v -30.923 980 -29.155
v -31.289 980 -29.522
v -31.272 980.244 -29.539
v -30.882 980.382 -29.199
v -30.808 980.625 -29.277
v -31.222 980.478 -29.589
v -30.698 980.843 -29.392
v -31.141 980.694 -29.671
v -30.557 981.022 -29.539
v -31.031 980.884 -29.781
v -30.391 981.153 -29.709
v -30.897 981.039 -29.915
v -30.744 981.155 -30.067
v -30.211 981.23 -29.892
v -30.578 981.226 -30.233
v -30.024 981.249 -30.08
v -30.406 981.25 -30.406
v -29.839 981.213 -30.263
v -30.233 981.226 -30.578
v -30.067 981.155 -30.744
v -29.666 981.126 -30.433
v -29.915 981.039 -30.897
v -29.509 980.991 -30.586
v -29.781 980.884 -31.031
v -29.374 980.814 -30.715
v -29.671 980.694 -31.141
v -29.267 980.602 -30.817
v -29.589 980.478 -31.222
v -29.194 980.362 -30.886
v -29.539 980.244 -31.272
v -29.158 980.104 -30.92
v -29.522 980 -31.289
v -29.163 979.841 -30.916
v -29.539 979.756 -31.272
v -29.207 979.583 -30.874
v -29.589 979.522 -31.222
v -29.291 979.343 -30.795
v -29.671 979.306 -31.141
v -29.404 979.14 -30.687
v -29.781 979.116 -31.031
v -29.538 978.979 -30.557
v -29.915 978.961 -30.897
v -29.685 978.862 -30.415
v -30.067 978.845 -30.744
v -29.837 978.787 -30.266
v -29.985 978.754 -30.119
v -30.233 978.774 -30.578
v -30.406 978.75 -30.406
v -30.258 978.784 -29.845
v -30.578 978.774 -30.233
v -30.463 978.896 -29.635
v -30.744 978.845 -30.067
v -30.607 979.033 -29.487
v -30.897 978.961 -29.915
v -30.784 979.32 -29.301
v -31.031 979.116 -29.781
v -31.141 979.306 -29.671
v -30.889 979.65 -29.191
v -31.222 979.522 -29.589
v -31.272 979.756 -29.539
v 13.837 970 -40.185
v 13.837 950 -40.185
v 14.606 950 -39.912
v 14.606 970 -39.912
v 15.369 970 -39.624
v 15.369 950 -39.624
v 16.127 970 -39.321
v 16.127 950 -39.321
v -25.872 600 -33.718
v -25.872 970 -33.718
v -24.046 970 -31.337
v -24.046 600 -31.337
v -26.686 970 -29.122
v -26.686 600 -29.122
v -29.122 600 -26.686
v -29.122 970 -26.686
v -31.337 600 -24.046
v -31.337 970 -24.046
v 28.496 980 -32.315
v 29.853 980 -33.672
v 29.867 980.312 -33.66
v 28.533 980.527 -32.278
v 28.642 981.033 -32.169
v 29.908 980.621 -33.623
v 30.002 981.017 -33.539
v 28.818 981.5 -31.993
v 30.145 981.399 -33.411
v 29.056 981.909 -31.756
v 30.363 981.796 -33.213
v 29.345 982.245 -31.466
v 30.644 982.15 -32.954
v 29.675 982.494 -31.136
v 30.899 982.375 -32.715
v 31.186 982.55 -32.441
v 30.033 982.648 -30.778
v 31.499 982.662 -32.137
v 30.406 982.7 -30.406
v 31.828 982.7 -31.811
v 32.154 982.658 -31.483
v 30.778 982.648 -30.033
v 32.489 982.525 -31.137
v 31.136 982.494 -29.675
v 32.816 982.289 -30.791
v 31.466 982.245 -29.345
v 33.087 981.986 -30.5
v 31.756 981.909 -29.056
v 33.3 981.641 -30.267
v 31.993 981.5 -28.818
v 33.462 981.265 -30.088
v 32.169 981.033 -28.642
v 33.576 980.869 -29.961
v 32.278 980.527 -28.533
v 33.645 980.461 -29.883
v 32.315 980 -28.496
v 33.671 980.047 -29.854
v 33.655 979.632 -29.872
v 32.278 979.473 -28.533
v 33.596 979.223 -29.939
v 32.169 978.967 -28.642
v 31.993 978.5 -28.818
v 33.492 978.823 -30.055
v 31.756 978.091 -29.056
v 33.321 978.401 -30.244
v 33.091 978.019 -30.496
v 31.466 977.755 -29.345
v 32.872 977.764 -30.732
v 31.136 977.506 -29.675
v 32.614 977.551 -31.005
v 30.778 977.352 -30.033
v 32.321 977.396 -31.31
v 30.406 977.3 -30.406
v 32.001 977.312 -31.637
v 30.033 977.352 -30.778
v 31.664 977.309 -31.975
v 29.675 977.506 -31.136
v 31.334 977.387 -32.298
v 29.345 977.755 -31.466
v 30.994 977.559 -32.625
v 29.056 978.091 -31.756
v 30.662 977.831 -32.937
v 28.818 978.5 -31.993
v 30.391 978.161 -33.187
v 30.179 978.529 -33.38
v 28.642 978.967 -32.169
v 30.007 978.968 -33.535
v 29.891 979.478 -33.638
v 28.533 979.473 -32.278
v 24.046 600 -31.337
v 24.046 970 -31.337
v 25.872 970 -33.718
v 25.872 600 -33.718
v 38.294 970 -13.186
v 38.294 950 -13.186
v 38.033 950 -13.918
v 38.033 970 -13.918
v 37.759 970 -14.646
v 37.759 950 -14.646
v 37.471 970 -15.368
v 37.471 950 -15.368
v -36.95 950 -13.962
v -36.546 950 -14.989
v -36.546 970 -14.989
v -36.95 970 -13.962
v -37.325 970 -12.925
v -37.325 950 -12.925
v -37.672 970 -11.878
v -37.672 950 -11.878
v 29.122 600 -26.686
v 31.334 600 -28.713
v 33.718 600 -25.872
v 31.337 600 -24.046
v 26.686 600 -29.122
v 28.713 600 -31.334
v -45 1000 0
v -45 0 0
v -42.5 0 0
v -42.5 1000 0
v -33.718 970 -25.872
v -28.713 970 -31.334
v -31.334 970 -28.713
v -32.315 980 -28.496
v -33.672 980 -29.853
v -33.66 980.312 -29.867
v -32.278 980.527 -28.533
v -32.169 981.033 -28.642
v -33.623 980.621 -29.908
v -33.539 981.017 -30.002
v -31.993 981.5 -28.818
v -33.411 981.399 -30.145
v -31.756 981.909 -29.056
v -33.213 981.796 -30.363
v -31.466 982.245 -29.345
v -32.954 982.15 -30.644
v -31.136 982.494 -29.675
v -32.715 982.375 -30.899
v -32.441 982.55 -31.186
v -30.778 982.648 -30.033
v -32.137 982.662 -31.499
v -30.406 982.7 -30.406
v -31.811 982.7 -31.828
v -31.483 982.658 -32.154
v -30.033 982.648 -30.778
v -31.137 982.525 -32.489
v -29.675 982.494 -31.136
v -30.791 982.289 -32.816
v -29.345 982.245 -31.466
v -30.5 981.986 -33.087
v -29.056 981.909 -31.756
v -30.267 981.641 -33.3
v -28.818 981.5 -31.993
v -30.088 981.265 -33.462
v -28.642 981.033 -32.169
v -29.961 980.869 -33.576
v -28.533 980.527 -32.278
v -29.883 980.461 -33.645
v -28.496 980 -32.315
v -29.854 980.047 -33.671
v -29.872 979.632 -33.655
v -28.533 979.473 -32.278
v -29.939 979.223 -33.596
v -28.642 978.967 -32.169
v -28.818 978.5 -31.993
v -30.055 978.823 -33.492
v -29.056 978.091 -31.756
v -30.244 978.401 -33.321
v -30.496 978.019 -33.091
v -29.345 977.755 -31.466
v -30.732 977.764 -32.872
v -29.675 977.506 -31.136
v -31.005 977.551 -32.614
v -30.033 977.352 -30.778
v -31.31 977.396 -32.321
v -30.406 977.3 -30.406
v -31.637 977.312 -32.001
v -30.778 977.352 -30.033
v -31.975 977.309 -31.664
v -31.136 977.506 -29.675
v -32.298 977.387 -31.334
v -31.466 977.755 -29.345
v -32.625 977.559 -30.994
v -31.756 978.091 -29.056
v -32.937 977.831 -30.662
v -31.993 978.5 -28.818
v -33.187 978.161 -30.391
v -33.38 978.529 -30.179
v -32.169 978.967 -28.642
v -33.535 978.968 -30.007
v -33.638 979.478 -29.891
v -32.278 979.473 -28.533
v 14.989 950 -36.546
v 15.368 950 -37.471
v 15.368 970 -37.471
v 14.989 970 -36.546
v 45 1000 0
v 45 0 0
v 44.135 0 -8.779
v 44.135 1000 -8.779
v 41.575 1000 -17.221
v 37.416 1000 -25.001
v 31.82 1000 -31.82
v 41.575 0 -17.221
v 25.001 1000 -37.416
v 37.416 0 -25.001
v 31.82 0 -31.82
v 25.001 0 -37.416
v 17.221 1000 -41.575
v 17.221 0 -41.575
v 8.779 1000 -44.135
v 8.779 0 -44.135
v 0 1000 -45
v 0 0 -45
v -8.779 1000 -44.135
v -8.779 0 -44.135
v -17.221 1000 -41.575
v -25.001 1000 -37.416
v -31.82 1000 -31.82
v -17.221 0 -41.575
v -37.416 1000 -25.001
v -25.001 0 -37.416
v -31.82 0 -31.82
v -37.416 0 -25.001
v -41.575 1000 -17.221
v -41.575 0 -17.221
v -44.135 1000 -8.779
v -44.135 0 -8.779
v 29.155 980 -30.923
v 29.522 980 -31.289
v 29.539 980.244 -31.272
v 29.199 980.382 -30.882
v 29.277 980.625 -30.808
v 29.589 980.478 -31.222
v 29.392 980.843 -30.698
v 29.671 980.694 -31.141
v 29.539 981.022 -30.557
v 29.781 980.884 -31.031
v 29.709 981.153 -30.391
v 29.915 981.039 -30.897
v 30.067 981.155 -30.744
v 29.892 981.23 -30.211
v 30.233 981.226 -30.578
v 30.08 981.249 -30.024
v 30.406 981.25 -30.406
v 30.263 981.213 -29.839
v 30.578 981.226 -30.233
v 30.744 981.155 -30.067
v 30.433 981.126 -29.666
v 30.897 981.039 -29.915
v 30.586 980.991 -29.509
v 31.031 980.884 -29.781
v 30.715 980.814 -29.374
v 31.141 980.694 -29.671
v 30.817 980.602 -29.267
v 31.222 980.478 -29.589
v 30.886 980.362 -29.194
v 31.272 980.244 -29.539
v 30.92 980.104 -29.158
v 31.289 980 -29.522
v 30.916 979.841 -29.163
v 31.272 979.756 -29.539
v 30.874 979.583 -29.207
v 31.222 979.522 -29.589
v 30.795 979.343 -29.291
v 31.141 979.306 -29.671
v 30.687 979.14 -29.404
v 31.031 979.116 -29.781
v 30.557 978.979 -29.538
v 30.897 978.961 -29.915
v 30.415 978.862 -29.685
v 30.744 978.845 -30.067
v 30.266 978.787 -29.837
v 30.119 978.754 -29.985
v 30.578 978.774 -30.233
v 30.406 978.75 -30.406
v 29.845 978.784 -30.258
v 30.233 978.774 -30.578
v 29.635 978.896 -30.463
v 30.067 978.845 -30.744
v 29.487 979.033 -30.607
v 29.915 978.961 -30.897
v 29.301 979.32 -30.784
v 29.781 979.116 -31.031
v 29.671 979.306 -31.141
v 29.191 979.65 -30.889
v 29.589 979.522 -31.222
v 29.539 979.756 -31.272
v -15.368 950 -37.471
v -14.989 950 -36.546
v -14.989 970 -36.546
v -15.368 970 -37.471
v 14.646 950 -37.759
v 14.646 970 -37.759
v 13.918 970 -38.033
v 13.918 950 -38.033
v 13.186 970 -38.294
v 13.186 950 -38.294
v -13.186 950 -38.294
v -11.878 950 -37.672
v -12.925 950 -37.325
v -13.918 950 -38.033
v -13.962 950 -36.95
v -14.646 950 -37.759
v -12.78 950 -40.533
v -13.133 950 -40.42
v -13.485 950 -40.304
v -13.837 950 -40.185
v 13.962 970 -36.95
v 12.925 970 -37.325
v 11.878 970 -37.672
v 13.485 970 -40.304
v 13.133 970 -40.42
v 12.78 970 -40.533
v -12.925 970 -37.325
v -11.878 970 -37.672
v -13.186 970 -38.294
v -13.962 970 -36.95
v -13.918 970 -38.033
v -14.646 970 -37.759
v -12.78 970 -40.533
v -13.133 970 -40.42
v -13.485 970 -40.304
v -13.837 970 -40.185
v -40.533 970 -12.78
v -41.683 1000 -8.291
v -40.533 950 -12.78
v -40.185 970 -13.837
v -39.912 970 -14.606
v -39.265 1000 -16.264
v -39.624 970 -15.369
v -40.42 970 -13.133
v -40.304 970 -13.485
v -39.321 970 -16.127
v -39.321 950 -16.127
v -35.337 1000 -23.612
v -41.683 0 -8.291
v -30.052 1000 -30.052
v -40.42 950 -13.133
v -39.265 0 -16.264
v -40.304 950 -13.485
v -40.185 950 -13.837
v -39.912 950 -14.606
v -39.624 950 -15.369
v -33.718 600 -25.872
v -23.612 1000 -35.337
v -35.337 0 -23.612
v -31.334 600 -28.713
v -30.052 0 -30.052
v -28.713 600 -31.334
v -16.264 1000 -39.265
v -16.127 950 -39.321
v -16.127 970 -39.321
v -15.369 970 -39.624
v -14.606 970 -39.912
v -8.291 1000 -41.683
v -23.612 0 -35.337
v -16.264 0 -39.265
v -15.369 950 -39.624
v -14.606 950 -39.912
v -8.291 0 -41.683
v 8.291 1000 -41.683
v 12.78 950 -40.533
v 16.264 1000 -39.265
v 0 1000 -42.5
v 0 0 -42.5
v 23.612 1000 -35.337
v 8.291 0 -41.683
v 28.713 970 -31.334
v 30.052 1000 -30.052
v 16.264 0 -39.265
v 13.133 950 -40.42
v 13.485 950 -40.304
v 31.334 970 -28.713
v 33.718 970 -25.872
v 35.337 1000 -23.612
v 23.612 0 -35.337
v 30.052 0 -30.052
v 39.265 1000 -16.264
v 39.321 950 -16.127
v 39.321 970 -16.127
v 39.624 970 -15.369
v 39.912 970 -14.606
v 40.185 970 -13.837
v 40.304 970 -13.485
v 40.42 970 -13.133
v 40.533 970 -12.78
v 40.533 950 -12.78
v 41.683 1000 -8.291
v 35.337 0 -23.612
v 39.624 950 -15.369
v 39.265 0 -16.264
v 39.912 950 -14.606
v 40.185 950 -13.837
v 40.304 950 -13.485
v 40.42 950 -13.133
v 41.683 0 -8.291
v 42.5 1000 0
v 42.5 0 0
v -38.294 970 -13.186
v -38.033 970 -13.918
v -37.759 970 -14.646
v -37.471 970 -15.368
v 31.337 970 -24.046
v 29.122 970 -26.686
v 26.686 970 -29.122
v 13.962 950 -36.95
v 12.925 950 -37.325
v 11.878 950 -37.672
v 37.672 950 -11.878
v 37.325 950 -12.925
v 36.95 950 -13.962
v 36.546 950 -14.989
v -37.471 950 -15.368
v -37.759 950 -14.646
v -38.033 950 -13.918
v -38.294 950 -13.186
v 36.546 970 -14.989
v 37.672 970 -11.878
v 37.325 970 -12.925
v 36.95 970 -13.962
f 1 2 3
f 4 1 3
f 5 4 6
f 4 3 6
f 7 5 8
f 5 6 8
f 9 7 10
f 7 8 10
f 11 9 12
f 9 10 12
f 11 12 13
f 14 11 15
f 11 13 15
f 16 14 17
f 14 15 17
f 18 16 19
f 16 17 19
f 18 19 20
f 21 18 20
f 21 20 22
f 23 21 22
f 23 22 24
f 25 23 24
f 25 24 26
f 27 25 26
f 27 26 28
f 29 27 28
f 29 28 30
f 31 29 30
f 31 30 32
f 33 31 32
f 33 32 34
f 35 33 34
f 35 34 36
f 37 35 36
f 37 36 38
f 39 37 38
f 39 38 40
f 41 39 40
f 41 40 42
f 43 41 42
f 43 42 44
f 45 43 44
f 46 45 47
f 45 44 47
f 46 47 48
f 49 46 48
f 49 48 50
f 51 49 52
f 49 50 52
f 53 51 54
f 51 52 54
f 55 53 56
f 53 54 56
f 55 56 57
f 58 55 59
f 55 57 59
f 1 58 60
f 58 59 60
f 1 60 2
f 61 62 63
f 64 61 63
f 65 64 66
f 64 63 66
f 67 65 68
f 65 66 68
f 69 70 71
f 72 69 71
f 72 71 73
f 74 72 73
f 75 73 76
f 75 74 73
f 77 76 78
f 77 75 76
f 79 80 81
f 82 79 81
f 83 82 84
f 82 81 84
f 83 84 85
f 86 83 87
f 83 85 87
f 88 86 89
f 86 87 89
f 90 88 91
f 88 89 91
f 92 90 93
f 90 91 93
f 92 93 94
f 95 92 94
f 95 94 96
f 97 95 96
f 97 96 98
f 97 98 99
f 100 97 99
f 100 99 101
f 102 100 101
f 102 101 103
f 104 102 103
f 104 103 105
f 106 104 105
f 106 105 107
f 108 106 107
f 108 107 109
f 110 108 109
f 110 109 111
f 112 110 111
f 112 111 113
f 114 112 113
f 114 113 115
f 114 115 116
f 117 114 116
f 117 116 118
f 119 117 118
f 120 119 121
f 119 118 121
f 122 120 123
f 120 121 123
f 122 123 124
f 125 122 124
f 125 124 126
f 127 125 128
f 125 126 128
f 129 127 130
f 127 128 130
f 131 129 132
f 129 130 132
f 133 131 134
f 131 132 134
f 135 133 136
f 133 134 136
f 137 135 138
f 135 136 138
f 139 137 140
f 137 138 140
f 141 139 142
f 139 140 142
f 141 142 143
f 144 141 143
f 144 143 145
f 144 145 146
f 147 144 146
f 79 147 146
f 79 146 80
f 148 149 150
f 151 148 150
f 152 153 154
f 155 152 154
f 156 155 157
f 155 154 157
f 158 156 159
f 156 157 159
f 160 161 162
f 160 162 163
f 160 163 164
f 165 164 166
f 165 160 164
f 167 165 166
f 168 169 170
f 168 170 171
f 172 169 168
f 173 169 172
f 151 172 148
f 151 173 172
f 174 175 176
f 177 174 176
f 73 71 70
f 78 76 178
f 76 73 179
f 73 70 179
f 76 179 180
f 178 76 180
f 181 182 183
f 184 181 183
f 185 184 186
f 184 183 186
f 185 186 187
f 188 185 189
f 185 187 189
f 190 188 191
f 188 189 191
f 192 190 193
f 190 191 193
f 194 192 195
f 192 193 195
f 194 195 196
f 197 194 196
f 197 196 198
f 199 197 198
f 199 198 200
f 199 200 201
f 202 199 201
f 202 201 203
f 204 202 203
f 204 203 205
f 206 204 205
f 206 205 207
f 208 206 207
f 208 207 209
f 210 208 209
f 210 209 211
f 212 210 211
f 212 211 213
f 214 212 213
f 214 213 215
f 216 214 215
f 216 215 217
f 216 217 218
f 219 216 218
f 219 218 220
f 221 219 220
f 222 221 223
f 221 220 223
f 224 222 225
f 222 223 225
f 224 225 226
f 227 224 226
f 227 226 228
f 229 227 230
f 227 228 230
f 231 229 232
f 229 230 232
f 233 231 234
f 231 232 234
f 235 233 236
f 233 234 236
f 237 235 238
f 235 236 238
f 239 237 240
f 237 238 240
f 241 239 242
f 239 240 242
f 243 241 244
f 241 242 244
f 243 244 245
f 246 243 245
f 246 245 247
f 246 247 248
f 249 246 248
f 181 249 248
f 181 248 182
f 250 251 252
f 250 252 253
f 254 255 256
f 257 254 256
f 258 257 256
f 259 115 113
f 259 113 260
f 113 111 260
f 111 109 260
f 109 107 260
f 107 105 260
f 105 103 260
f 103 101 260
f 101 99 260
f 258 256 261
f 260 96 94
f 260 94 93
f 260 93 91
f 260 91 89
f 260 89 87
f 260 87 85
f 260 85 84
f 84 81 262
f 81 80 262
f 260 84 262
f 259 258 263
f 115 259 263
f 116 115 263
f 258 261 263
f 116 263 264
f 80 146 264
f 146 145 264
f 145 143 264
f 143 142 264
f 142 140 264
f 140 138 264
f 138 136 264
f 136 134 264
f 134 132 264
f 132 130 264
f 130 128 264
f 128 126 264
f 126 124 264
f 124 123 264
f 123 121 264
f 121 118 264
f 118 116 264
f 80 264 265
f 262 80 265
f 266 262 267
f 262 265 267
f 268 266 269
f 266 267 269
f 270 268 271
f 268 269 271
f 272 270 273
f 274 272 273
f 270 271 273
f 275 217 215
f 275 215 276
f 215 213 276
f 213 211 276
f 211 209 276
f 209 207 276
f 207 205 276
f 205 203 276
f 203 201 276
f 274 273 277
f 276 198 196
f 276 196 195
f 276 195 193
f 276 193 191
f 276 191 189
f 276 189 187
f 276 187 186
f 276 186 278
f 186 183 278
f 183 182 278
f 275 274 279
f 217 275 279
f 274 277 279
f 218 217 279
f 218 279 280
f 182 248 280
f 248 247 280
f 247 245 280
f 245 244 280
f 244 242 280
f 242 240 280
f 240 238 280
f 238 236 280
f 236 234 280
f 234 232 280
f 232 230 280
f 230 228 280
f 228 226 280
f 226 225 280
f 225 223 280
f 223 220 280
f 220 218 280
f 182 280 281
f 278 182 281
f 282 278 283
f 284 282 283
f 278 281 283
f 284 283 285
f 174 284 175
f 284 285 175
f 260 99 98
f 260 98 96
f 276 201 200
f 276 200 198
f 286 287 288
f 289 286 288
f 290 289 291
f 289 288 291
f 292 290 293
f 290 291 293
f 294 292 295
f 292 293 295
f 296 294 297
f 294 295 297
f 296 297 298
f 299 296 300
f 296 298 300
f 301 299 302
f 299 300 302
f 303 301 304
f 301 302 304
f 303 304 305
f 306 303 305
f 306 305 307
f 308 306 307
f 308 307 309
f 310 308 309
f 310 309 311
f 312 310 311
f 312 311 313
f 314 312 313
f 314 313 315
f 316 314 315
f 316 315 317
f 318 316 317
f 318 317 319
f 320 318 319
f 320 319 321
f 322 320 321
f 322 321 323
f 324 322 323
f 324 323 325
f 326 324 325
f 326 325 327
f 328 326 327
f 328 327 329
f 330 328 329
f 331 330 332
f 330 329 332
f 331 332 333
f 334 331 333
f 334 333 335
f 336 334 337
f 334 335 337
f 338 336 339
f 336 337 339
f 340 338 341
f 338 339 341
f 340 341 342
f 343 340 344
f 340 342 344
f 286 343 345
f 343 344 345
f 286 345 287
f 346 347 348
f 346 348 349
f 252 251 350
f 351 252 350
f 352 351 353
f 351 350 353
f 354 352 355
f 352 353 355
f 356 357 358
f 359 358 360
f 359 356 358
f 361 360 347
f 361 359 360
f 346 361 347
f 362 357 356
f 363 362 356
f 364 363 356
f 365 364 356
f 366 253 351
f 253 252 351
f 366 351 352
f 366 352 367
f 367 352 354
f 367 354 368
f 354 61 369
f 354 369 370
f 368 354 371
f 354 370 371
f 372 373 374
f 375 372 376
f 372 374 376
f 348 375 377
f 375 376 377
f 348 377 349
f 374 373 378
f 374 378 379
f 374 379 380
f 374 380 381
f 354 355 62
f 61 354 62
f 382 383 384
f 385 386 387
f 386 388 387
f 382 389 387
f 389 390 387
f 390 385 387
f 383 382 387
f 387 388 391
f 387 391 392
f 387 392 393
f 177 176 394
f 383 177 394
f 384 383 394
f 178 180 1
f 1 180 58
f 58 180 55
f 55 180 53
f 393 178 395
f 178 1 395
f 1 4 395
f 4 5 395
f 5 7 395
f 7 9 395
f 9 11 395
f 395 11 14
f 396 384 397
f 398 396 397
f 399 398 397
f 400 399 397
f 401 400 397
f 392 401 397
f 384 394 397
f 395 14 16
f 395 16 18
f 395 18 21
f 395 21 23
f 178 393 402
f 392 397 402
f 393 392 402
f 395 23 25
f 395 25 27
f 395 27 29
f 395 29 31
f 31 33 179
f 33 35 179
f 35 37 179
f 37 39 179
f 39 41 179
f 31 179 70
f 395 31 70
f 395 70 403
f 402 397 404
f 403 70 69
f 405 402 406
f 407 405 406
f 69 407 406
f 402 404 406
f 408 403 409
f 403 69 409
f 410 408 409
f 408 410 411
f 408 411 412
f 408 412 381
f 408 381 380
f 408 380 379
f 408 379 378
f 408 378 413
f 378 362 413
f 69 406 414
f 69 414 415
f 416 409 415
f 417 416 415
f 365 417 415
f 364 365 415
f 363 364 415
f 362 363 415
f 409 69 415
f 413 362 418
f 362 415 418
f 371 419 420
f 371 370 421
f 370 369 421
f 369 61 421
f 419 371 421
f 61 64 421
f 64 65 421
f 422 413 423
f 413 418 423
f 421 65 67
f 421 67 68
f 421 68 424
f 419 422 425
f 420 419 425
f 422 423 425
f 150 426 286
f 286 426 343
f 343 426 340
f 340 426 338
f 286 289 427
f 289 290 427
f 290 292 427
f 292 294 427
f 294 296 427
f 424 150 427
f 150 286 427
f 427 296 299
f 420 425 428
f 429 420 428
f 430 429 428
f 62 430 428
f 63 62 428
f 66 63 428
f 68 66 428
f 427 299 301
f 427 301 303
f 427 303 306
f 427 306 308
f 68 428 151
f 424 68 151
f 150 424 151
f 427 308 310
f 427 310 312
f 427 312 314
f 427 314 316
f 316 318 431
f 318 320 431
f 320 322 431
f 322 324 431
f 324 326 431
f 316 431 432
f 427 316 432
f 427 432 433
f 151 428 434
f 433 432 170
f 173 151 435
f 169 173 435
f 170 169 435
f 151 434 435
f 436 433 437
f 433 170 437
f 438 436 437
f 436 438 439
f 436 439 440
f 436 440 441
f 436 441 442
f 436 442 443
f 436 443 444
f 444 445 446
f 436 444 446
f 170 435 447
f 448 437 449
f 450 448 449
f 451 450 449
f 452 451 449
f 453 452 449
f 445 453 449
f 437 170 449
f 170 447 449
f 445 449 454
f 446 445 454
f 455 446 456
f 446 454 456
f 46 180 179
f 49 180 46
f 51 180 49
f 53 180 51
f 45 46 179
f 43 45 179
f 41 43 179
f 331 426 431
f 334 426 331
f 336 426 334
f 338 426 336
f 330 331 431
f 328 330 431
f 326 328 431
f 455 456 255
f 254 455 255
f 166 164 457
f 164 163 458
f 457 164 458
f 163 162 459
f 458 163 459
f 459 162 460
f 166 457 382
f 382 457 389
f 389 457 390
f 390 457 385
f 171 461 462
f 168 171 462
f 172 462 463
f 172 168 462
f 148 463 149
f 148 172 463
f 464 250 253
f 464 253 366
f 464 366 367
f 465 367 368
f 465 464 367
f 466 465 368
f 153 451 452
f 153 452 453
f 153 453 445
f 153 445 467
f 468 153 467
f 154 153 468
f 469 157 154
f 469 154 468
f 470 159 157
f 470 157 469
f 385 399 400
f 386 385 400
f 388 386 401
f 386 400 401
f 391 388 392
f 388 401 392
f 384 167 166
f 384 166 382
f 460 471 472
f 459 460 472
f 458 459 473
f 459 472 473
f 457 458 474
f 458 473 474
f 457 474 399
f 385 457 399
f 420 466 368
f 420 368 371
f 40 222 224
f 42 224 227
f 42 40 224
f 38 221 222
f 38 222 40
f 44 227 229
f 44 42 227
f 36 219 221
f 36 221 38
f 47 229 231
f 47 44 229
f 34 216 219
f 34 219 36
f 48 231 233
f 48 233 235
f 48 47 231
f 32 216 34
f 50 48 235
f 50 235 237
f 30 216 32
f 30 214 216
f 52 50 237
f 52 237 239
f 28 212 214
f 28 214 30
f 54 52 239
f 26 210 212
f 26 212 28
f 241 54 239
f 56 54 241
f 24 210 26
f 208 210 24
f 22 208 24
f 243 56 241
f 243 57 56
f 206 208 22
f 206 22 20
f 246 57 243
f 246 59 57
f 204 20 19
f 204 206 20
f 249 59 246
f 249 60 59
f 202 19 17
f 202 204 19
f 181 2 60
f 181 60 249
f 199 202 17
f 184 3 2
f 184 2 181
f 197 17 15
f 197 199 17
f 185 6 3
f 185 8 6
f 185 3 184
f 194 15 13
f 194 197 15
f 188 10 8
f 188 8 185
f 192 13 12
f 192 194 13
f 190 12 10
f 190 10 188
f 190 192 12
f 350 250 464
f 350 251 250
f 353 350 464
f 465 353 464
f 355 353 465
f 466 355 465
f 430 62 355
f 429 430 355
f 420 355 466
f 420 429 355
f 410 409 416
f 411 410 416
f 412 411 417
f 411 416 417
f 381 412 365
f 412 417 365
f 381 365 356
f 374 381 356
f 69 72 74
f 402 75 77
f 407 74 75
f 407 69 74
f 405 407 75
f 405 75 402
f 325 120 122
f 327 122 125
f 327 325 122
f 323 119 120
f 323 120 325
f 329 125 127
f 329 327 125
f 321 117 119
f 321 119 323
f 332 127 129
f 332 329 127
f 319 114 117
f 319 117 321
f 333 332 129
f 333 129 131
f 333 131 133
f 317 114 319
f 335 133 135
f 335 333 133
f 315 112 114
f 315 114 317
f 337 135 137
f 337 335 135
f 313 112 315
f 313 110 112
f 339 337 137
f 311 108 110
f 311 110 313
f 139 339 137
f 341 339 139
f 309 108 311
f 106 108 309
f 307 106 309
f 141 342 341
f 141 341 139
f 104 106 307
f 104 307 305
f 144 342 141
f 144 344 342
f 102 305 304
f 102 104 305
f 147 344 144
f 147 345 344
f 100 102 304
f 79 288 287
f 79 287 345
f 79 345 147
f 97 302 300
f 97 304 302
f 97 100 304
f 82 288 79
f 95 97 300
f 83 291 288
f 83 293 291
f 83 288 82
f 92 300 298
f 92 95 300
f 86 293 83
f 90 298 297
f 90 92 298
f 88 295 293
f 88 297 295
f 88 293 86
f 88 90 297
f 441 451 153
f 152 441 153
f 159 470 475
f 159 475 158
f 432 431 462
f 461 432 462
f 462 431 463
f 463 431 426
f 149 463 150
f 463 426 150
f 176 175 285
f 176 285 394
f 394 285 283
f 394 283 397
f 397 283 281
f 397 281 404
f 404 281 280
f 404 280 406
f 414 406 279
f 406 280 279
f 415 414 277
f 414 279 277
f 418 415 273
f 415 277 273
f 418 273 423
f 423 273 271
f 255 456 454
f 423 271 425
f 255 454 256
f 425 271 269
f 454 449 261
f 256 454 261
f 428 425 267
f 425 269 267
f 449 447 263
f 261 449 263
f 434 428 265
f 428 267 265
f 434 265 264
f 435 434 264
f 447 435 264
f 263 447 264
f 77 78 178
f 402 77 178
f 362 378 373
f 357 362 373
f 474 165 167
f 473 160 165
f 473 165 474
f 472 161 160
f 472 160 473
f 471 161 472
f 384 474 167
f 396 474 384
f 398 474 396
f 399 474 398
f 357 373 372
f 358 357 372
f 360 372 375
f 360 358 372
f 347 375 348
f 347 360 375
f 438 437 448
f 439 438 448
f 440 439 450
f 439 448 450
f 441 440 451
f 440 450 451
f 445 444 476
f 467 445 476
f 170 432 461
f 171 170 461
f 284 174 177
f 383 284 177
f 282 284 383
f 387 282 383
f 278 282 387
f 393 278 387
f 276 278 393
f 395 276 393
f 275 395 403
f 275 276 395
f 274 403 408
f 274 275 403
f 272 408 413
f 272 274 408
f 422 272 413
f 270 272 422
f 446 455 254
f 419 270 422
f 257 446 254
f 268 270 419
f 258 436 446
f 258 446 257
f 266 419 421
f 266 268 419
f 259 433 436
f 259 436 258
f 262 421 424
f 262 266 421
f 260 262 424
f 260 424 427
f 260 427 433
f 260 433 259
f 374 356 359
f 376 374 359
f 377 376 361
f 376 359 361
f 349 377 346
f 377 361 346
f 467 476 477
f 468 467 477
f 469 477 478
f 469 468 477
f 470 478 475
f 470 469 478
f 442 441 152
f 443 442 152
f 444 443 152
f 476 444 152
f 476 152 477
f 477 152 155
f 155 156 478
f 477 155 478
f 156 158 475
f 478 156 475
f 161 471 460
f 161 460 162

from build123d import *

# Parameters (mm, degrees)
EXTRUDE_1_DEPTH     = 1000
EXTRUDE_START       = -400
EXTRUDE_3_DEPTH     = 370
EXTRUDE_START_2     = -50
EXTRUDE_4_DEPTH     = 20
CUT_EXTRUDE_START   = -20
CUT_EXTRUDE_1_DEPTH = 20
SKETCH_8_R          = 2.7
CUT_EXTRUDE_4_DEPTH = 2
SKETCH_9_R          = 1.25
CUT_EXTRUDE_5_DEPTH = 6
SKETCH_10_R         = 2.7
CUT_EXTRUDE_6_DEPTH = 2
SKETCH_11_R         = 1.25
CUT_EXTRUDE_7_DEPTH = 6


with BuildPart() as part:
    # 草图1 → 凸台-拉伸1 (new body)
    with BuildSketch(Plane(origin=(0, 0, 0), x_dir=(1, 0, 0), z_dir=(0, 1, 0))):
        with BuildLine():
            Line((-45, 0), (-42.5, 0))
            ThreePointArc((-42.5, 0), (0, 42.5), (42.5, 0))
            Line((42.5, 0), (45, 0))
            ThreePointArc((45, 0), (0, 45), (-45, 0))
        make_face()
    extrude(amount=EXTRUDE_1_DEPTH)

    # 草图3 → 凸台-拉伸3 (add)
    with BuildSketch(Plane(origin=(0, 1000, 0), x_dir=(1, 0, 0), z_dir=(0, 1, 0)).offset(EXTRUDE_START)):
        with BuildLine():
            Line((-31.337456942, 24.046076446), (-33.717516962, 25.872360733))
            ThreePointArc((-33.717516962, 25.872360733), (-30.0520382, 30.0520382), (-25.872360733, 33.717516962))
            Line((-25.872360733, 33.717516962), (-24.046076446, 31.337456942))
            ThreePointArc((-24.046076446, 31.337456942), (-27.930717857, 27.930717857), (-31.337456942, 24.046076446))
        make_face()
        with BuildLine():
            Line((24.046076446, 31.337456942), (25.872360733, 33.717516962))
            ThreePointArc((25.872360733, 33.717516962), (30.0520382, 30.0520382), (33.717516962, 25.872360733))
            Line((33.717516962, 25.872360733), (31.337456942, 24.046076446))
            ThreePointArc((31.337456942, 24.046076446), (27.930717857, 27.930717857), (24.046076446, 31.337456942))
        make_face()
    extrude(amount=EXTRUDE_3_DEPTH)

    # 草图4 → 凸台-拉伸4 (add)
    with BuildSketch(Plane(origin=(0, 1000, 0), x_dir=(1, 0, 0), z_dir=(0, 1, 0)).offset(EXTRUDE_START_2)):
        with BuildLine():
            Line((-37.671819555, 11.87787908), (-40.532970407, 12.779996479))
            ThreePointArc((-40.532970407, 12.779996479), (-39.962245398, 14.466130884), (-39.321413031, 16.12688678))
            Line((-39.321413031, 16.12688678), (-36.545783876, 14.988518301))
            ThreePointArc((-36.545783876, 14.988518301), (-37.141381017, 13.444992233), (-37.671819555, 11.87787908))
        make_face()
        with BuildLine():
            Line((36.545783876, 14.988518301), (39.321413031, 16.12688678))
            ThreePointArc((39.321413031, 16.12688678), (39.962245398, 14.466130884), (40.532970407, 12.779996479))
            Line((40.532970407, 12.779996479), (37.671819555, 11.87787908))
            ThreePointArc((37.671819555, 11.87787908), (37.141381017, 13.444992233), (36.545783876, 14.988518301))
        make_face()
        with BuildLine():
            Line((11.87787908, 37.671819555), (12.779996479, 40.532970407))
            ThreePointArc((12.779996479, 40.532970407), (14.466130884, 39.962245398), (16.12688678, 39.321413031))
            Line((16.12688678, 39.321413031), (14.988518301, 36.545783876))
            ThreePointArc((14.988518301, 36.545783876), (13.444992233, 37.141381017), (11.87787908, 37.671819555))
        make_face()
        with BuildLine():
            Line((-14.988518301, 36.545783876), (-16.12688678, 39.321413031))
            ThreePointArc((-16.12688678, 39.321413031), (-14.466130884, 39.962245398), (-12.779996479, 40.532970407))
            Line((-12.779996479, 40.532970407), (-11.87787908, 37.671819555))
            ThreePointArc((-11.87787908, 37.671819555), (-13.444992233, 37.141381017), (-14.988518301, 36.545783876))
        make_face()
    extrude(amount=EXTRUDE_4_DEPTH)

    # 草图5 → 切除-拉伸1 (cut)
    with BuildSketch(Plane(origin=(0, 970, 0), x_dir=(1, 0, 0), z_dir=(0, 1, 0)).offset(CUT_EXTRUDE_START)):
        with BuildLine():
            Line((-38.293502312, 13.185510256), (-40.184539463, 13.836646564))
            ThreePointArc((-40.184539463, 13.836646564), (-39.769465933, 14.987981166), (-39.321413031, 16.12688678))
            Line((-39.321413031, 16.12688678), (-37.444114361, 15.433350242))
            ThreePointArc((-37.444114361, 15.433350242), (-37.885483249, 14.315731173), (-38.293502312, 13.185510256))
        make_face()
        with BuildLine():
            Line((-15.433350242, 37.444114361), (-16.12688678, 39.321413031))
            ThreePointArc((-16.12688678, 39.321413031), (-14.987981166, 39.769465933), (-13.836646564, 40.184539463))
            Line((-13.836646564, 40.184539463), (-13.185510256, 38.293502312))
            ThreePointArc((-13.185510256, 38.293502312), (-14.315731173, 37.885483249), (-15.433350242, 37.444114361))
        make_face()
        with BuildLine():
            Line((13.185510256, 38.293502312), (13.836646564, 40.184539463))
            ThreePointArc((13.836646564, 40.184539463), (14.987981166, 39.769465933), (16.12688678, 39.321413031))
            Line((16.12688678, 39.321413031), (15.433350242, 37.444114361))
            ThreePointArc((15.433350242, 37.444114361), (14.315731173, 37.885483249), (13.185510256, 38.293502312))
        make_face()
        with BuildLine():
            Line((37.444114361, 15.433350242), (39.321413031, 16.12688678))
            ThreePointArc((39.321413031, 16.12688678), (39.769465933, 14.987981166), (40.184539463, 13.836646564))
            Line((40.184539463, 13.836646564), (38.293502312, 13.185510256))
            ThreePointArc((38.293502312, 13.185510256), (37.885483249, 14.315731173), (37.444114361, 15.433350242))
        make_face()
    extrude(amount=CUT_EXTRUDE_1_DEPTH, mode=Mode.SUBTRACT)

    # 草图8 → 切除-拉伸4 (cut)
    with BuildSketch(Plane(origin=(-31.819805153, 0, -31.819805153), x_dir=(0, -1, 0), z_dir=(-0.7071067811865488, 0, -0.7071067811865464))):
        with Locations(Location((-980, 0, 0), (0, 0, 90))):
            Circle(SKETCH_8_R)
    extrude(amount=-CUT_EXTRUDE_4_DEPTH, mode=Mode.SUBTRACT)

    # 草图9 → 切除-拉伸5 (cut)
    with BuildSketch(Plane(origin=(-31.819805153, 0, -31.819805153), x_dir=(0, -1, 0), z_dir=(-0.7071067811865488, 0, -0.7071067811865464))):
        with Locations(Location((-980, 0, 0), (0, 0, 90))):
            Circle(SKETCH_9_R)
    extrude(amount=-CUT_EXTRUDE_5_DEPTH, mode=Mode.SUBTRACT)

    # 草图10 → 切除-拉伸6 (cut)
    with BuildSketch(Plane(origin=(31.819805153, 0, -31.819805153), x_dir=(0, -1, 0), z_dir=(0.7071067811865488, 0, -0.7071067811865464))):
        with Locations(Location((-980, 0, 0), (0, 0, 90))):
            Circle(SKETCH_10_R)
    extrude(amount=-CUT_EXTRUDE_6_DEPTH, mode=Mode.SUBTRACT)

    # 草图11 → 切除-拉伸7 (cut)
    with BuildSketch(Plane(origin=(31.819805153, 0, -31.819805153), x_dir=(0, -1, 0), z_dir=(0.7071067811865488, 0, -0.7071067811865464))):
        with Locations(Location((-980, 0, 0), (0, 0, 90))):
            Circle(SKETCH_11_R)
    extrude(amount=-CUT_EXTRUDE_7_DEPTH, mode=Mode.SUBTRACT)


solid = part.part
